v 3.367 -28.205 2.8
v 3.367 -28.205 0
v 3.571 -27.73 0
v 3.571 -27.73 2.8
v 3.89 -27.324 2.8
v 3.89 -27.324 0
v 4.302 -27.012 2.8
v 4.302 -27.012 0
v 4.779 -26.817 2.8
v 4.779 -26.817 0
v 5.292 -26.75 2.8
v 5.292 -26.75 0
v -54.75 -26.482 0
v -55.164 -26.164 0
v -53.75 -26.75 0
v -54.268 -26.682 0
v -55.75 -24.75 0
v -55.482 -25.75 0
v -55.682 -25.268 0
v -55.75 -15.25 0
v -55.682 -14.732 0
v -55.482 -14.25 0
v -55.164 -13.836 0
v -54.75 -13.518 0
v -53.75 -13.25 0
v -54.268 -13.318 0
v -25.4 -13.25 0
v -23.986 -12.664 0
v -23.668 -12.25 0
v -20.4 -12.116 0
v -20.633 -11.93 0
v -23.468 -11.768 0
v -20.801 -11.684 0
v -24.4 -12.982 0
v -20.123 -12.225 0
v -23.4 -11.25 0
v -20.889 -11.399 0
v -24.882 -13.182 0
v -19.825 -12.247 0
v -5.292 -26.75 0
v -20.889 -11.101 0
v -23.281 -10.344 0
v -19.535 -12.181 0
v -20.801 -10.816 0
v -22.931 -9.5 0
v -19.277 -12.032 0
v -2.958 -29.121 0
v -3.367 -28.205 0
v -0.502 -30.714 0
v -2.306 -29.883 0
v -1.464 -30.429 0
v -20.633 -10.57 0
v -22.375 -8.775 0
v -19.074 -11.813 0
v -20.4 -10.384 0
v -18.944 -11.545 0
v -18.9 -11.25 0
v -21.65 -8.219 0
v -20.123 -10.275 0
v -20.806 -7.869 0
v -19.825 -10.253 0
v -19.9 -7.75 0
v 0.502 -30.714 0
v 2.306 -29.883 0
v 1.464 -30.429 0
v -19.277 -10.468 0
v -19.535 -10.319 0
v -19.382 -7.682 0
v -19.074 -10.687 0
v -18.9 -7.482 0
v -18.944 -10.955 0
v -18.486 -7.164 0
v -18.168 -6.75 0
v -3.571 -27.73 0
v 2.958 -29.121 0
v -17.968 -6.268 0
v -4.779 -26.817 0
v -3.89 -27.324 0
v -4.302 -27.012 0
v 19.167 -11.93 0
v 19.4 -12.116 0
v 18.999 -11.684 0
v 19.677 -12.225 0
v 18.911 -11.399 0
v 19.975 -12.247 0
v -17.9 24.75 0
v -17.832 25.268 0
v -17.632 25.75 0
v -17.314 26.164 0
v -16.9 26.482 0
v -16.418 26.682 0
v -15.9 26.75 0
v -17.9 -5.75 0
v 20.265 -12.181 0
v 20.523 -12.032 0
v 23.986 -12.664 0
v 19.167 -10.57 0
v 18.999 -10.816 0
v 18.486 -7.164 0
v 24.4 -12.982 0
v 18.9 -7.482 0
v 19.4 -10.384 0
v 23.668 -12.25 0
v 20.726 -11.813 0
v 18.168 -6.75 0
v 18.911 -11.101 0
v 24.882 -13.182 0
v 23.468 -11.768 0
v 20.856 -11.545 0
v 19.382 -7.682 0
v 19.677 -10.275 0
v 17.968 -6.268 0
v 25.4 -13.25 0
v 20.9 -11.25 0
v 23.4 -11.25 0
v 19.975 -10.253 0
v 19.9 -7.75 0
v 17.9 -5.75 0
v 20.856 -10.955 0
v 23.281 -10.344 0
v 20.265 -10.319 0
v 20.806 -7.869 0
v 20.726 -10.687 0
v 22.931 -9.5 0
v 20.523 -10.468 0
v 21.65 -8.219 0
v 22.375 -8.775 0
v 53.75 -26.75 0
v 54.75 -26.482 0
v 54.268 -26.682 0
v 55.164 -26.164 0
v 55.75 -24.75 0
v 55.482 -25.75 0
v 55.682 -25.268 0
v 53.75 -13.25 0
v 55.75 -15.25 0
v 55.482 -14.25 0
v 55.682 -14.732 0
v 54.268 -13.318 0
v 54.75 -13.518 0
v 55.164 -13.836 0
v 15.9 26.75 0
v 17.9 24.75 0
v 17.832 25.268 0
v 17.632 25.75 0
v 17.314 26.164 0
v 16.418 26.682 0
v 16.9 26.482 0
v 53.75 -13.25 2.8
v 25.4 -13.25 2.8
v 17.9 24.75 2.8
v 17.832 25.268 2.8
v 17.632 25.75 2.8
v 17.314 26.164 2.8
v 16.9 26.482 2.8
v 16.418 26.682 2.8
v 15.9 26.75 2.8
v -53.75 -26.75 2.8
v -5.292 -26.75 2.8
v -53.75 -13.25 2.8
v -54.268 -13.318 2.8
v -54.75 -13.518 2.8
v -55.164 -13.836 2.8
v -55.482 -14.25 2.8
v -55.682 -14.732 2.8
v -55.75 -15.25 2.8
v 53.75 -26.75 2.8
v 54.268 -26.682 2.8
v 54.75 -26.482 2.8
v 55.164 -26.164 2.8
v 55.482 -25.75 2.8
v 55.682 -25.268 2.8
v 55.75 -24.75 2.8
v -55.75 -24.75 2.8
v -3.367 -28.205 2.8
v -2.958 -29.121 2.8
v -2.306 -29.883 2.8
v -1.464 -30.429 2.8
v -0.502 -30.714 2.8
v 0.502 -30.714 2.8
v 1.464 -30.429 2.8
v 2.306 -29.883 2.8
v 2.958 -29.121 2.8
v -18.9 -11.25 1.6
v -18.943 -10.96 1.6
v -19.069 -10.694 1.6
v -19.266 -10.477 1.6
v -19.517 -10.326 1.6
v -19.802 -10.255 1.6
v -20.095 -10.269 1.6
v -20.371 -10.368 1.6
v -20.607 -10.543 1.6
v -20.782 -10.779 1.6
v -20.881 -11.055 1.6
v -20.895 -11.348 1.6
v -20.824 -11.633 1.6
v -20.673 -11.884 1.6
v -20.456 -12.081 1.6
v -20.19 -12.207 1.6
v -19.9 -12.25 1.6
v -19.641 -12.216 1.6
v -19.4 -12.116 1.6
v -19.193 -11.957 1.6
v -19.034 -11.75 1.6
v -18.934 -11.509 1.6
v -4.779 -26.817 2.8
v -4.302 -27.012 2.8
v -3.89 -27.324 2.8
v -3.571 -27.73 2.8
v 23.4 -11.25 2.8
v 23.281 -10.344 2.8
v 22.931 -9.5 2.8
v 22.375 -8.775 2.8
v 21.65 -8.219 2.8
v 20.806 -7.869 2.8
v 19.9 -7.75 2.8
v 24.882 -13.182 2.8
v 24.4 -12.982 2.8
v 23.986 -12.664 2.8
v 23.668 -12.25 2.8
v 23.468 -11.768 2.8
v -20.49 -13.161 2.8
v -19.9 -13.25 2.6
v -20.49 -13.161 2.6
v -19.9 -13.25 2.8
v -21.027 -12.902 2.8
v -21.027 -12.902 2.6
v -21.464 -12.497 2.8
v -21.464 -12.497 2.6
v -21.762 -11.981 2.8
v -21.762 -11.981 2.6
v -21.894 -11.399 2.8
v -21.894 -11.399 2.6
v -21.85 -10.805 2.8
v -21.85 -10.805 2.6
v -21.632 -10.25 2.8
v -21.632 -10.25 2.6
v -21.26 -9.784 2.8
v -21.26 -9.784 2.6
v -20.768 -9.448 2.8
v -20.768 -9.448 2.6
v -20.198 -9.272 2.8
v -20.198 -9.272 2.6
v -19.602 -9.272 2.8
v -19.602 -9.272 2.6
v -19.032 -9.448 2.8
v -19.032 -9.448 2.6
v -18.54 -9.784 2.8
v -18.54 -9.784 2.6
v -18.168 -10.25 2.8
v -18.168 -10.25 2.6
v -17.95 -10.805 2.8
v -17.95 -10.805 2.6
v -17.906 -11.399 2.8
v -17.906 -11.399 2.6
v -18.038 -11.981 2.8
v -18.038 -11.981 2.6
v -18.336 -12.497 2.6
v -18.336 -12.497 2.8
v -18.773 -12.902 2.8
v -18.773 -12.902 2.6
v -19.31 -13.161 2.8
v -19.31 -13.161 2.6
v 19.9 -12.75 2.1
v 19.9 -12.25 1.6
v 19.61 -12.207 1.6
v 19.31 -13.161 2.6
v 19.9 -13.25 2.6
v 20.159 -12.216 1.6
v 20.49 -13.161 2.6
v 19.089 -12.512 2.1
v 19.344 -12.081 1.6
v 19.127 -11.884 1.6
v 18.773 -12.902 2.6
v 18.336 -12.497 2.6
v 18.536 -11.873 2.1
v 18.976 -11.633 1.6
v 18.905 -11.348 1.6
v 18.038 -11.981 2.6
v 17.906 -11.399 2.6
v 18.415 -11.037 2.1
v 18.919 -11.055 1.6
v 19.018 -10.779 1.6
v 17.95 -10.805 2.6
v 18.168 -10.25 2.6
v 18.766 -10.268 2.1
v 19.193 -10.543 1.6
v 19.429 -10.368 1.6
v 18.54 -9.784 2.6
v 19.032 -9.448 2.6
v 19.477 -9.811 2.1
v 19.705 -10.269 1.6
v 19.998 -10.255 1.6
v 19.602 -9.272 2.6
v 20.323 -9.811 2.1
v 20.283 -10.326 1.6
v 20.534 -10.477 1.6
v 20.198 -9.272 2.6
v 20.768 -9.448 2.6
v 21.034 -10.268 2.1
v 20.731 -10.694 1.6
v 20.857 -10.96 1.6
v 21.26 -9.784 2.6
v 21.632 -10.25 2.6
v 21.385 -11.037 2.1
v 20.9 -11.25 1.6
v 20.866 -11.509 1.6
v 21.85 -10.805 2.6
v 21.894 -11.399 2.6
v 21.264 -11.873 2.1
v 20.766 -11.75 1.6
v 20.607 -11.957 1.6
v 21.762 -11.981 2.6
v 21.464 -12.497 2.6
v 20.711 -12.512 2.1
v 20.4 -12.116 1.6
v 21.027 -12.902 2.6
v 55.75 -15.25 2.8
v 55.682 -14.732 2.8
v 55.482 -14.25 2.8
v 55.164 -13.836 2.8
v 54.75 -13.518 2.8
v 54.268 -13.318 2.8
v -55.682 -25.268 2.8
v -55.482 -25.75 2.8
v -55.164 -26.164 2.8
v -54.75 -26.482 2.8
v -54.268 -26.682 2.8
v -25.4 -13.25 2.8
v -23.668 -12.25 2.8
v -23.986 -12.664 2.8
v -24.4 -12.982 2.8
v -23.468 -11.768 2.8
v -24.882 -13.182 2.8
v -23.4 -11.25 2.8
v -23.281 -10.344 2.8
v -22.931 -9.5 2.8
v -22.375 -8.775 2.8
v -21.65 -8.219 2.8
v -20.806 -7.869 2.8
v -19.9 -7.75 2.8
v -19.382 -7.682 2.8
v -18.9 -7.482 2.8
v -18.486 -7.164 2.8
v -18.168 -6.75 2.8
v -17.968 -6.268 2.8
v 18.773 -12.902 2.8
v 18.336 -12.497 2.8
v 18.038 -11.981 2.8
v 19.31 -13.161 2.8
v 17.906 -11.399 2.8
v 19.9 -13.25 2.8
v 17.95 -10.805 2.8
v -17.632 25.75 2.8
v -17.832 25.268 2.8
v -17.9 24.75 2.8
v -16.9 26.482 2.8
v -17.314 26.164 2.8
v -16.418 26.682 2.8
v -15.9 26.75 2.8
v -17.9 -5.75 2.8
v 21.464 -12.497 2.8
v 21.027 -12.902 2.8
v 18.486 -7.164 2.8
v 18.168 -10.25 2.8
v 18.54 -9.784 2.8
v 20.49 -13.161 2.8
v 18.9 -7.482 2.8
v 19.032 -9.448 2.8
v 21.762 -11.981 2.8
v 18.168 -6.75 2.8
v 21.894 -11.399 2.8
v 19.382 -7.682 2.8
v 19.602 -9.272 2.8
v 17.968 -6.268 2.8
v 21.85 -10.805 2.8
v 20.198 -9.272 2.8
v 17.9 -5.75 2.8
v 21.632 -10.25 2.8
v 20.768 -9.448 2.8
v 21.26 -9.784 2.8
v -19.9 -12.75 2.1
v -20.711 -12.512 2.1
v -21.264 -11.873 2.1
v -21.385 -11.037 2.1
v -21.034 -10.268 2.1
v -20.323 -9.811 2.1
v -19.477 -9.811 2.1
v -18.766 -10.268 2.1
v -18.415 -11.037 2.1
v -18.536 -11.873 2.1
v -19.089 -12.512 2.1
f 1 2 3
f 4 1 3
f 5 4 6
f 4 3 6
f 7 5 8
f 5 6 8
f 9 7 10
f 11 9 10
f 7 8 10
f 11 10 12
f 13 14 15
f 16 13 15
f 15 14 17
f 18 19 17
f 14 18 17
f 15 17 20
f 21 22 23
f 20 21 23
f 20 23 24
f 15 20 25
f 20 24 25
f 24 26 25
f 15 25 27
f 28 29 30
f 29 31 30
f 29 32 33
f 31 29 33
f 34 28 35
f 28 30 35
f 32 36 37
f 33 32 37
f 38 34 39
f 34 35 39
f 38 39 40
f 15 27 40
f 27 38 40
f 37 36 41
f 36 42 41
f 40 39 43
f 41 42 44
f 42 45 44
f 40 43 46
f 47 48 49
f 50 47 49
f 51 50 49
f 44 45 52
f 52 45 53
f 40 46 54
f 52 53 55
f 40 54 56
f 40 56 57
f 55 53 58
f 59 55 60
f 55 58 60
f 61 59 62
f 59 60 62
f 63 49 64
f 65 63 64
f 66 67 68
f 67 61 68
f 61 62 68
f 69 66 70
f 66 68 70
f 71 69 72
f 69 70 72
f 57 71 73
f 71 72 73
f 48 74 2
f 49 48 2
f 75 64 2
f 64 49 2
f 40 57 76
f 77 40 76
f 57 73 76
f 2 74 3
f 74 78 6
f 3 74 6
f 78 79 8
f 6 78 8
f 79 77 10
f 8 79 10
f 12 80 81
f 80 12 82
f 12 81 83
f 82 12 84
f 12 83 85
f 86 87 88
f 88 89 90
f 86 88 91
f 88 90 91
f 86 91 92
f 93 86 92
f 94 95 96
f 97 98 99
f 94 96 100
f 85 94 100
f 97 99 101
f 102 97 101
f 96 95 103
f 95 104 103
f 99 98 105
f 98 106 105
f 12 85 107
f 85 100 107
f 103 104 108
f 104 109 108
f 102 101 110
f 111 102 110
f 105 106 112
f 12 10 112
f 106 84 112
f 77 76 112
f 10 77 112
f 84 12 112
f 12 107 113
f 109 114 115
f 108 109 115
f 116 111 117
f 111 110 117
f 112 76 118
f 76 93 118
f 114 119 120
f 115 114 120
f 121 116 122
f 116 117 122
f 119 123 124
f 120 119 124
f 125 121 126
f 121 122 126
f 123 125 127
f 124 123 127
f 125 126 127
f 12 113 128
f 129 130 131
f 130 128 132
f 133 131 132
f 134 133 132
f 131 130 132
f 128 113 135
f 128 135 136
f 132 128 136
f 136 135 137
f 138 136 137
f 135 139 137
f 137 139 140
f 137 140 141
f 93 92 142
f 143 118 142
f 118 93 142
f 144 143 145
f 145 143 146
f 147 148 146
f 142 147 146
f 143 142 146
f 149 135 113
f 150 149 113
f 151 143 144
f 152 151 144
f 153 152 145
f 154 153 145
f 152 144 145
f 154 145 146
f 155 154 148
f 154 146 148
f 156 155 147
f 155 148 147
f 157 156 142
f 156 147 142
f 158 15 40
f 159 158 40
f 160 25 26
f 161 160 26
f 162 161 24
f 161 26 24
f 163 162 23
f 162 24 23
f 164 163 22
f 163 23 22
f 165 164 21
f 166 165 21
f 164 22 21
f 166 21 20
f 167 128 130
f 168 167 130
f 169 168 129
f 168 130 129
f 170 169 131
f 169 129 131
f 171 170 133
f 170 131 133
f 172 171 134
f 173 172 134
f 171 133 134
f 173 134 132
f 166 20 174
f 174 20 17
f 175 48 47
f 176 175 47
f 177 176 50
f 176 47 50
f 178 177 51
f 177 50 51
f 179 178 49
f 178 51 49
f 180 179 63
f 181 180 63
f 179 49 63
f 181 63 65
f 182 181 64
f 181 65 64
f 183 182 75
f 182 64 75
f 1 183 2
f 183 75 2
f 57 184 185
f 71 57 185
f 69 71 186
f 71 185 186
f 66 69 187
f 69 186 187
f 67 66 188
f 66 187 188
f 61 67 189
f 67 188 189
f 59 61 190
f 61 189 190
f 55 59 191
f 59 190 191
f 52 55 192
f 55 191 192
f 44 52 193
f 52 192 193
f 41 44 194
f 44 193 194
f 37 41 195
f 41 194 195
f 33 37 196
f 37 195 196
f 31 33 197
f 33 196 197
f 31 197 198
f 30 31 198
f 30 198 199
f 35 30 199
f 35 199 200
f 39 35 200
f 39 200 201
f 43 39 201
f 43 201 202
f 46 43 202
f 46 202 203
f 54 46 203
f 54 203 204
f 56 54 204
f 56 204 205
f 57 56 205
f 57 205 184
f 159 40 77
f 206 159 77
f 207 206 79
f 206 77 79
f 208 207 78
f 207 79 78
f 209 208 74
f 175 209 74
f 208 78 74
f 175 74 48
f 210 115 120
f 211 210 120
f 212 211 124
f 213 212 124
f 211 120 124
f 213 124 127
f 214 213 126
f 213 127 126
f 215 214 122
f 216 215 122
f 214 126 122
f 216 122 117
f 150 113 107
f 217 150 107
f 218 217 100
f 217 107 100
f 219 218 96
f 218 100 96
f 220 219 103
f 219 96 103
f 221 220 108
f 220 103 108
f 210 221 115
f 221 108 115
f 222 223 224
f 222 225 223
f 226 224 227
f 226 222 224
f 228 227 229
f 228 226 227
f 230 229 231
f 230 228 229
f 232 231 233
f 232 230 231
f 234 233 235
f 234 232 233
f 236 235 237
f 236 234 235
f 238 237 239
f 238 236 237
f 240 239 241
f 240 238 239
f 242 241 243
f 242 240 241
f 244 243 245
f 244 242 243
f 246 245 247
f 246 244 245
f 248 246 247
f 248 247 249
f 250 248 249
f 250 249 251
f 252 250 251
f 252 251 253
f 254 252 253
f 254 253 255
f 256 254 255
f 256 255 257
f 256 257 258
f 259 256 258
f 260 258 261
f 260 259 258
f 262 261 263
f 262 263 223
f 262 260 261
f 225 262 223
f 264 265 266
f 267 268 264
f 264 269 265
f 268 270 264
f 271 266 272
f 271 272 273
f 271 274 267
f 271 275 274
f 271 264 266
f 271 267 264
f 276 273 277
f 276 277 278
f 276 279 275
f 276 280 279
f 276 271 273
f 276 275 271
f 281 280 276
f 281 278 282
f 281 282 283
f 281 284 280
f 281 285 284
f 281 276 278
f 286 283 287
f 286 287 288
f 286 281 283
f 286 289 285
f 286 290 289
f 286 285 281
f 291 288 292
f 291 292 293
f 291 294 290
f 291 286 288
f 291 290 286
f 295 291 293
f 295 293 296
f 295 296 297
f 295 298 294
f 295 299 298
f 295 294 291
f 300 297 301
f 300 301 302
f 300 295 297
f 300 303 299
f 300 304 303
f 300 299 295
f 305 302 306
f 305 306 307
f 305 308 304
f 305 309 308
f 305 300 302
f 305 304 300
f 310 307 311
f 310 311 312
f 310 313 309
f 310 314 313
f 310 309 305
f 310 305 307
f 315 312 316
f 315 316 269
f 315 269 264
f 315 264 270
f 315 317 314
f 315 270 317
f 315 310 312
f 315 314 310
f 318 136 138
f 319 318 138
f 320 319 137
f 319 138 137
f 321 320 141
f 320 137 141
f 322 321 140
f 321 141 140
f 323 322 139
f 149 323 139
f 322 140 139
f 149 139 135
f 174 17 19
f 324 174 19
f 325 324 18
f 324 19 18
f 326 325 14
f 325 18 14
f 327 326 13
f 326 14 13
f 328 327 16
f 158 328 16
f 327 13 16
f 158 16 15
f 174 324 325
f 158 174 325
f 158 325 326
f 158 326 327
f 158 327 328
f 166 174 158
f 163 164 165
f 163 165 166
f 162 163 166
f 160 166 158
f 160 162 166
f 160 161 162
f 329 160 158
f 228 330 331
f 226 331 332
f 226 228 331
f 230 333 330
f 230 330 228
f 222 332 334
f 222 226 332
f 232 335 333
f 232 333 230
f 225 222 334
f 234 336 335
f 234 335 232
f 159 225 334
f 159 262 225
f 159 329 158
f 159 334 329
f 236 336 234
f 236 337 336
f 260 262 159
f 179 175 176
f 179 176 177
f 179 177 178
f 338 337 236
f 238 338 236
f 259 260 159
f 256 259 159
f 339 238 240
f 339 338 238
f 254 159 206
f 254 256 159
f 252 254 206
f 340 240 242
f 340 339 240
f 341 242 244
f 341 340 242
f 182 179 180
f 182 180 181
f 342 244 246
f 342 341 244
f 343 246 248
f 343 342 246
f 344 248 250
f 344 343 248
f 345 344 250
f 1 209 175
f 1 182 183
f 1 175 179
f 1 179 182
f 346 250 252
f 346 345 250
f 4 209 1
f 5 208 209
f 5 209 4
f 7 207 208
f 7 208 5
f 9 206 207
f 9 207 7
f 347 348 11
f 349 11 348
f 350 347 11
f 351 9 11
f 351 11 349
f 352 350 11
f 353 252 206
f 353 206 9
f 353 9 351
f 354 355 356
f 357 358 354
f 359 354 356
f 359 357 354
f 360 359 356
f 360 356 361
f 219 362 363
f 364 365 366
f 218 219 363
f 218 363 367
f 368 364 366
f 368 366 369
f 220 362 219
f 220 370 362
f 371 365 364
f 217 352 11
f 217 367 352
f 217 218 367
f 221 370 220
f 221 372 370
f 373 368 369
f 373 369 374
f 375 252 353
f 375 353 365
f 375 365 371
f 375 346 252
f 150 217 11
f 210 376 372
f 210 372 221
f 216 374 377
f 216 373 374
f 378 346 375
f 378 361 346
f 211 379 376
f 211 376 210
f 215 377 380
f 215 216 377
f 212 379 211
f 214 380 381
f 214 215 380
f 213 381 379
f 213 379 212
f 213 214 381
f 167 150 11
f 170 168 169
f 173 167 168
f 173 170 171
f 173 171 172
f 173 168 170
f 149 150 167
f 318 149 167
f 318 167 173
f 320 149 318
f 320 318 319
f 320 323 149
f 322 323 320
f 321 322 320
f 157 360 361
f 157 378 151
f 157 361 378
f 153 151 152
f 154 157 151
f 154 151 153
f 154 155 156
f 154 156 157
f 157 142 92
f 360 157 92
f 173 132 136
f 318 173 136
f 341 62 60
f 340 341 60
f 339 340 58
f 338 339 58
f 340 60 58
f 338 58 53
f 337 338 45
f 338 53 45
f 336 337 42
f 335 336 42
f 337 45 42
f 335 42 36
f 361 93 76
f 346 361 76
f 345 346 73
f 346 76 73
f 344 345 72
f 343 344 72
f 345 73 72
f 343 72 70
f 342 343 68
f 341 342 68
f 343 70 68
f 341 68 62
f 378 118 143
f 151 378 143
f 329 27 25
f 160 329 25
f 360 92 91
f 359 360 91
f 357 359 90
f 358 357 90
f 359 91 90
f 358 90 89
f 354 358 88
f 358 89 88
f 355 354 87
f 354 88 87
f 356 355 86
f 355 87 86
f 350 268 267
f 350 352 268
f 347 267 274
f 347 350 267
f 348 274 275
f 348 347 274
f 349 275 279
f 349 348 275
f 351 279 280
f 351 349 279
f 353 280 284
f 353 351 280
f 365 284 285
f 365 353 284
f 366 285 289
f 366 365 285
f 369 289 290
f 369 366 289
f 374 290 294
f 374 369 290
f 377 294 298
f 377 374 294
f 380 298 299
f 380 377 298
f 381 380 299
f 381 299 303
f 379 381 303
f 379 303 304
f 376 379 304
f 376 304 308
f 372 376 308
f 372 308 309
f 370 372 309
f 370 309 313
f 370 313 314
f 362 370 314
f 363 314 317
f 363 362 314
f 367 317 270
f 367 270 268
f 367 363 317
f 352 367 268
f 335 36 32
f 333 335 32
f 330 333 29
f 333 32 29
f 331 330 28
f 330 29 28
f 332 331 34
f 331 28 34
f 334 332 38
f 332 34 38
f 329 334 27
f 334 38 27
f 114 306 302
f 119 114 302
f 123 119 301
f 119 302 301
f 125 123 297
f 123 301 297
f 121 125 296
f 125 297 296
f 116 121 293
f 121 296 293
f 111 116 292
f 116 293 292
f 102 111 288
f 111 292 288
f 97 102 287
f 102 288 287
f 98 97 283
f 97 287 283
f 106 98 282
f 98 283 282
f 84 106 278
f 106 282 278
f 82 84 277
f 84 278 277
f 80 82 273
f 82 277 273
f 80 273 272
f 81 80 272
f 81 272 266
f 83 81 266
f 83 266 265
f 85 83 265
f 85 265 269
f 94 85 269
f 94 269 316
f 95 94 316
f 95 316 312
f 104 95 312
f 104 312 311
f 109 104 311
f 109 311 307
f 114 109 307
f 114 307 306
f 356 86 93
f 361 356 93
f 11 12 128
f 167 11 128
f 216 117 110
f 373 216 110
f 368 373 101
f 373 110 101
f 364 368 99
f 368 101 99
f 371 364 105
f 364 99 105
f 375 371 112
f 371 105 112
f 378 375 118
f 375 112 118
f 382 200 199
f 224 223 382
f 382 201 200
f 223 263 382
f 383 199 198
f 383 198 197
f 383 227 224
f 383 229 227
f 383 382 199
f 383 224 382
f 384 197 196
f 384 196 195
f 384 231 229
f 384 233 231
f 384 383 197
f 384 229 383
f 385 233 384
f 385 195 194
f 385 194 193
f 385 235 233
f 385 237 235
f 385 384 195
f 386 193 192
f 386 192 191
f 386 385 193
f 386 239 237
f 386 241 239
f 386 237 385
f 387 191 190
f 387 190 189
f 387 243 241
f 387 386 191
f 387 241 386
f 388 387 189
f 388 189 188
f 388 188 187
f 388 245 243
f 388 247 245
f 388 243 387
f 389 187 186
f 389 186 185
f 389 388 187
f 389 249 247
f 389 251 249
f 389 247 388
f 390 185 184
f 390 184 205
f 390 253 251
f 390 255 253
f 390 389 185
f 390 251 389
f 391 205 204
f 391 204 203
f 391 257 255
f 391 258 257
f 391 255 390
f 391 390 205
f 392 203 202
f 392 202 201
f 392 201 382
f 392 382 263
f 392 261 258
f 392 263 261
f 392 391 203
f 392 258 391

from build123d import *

# Parameters (mm, degrees)
BOSS_EXTRUDE1_DEPTH                            = 2.8
CUT_EXTRUDE1_REACH                             = 4.8
SKETCH3_R                                      = 1
CSK_FOR_M2_FLAT_HEAD_MACHINE_SCREW1_AT_2_COUNT = 2
CSK_FOR_M2_FLAT_HEAD_MACHINE_SCREW1_AT_2_PITCH = 39.8


with BuildPart() as part:
    # Sketch1 → Boss-Extrude1 (new body)
    with BuildSketch(Plane.XY):
        with BuildLine():
            Line((-53.75, -26.75), (-5.291502622, -26.75))
            ThreePointArc((-5.291502622, -26.75), (-4.085457244, -27.15455193), (-3.36731985, -28.204545455))
            ThreePointArc((-3.36731985, -28.204545455), (0, -30.75), (3.36731985, -28.204545455))
            ThreePointArc((3.36731985, -28.204545455), (4.085457244, -27.15455193), (5.291502622, -26.75))
            Line((5.291502622, -26.75), (53.75, -26.75))
            ThreePointArc((53.75, -26.75), (55.164213562, -26.164213562), (55.75, -24.75))
            Line((55.75, -24.75), (55.75, -15.25))
            ThreePointArc((55.75, -15.25), (55.164213562, -13.835786438), (53.75, -13.25))
            Line((53.75, -13.25), (25.4, -13.25))
            ThreePointArc((25.4, -13.25), (23.985786438, -12.664213562), (23.4, -11.25))
            ThreePointArc((23.4, -11.25), (22.374873734, -8.775126266), (19.9, -7.75))
            ThreePointArc((19.9, -7.75), (18.485786438, -7.164213562), (17.9, -5.75))
            Line((17.9, -5.75), (17.9, 24.75))
            ThreePointArc((17.9, 24.75), (17.314213562, 26.164213562), (15.9, 26.75))
            Line((15.9, 26.75), (-15.9, 26.75))
            ThreePointArc((-15.9, 26.75), (-17.314213562, 26.164213562), (-17.9, 24.75))
            Line((-17.9, 24.75), (-17.9, -5.75))
            ThreePointArc((-17.9, -5.75), (-18.485786438, -7.164213562), (-19.9, -7.75))
            ThreePointArc((-19.9, -7.75), (-22.374873734, -8.775126266), (-23.4, -11.25))
            ThreePointArc((-23.4, -11.25), (-23.985786438, -12.664213562), (-25.4, -13.25))
            Line((-25.4, -13.25), (-53.75, -13.25))
            ThreePointArc((-53.75, -13.25), (-55.164213562, -13.835786438), (-55.75, -15.25))
            Line((-55.75, -15.25), (-55.75, -24.75))
            ThreePointArc((-55.75, -24.75), (-55.164213562, -26.164213562), (-53.75, -26.75))
        make_face()
    extrude(amount=BOSS_EXTRUDE1_DEPTH)

    # Sketch3 → Cut-Extrude1 (cut, up to next)
    with BuildSketch(Plane.XY.offset(2.8), mode=Mode.PRIVATE) as cut_extrude1_sk1:
        with Locations((-19.9, -11.25)):
            Circle(SKETCH3_R)
    cut_extrude1_tool1 = extrude(cut_extrude1_sk1.sketch, amount=-CUT_EXTRUDE1_REACH, mode=Mode.PRIVATE) & part.part
    add(cut_extrude1_tool1.solids().sort_by_distance((-19.9, -11.25, 2.8))[0], mode=Mode.SUBTRACT)
    # Sketch3 → Cut-Extrude1 (cut, up to next)
    with BuildSketch(Plane.XY.offset(2.8), mode=Mode.PRIVATE) as cut_extrude1_sk2:
        with Locations((19.9, -11.25)):
            Circle(SKETCH3_R)
    cut_extrude1_tool2 = extrude(cut_extrude1_sk2.sketch, amount=-CUT_EXTRUDE1_REACH, mode=Mode.PRIVATE) & part.part
    add(cut_extrude1_tool2.solids().sort_by_distance((19.9, -11.25, 2.8))[0], mode=Mode.SUBTRACT)

    # Sketch4 → CSK for M2 Flat Head Machine Screw1 (revolve, cut)
    with BuildSketch(Plane(origin=(-19.9, -11.25, 2.8), x_dir=(0, -1, 0), z_dir=(1, 0, 0))):
        Polygon((0, 0), (0, 2.8), (1, 2.8), (1, 1.2), (2, 0.2), (2, 0), align=None)
    csk_for_m2_flat_head_machine_screw1 = revolve(axis=Axis((-19.9, -11.25, 9.15), (0, 0, -1)), mode=Mode.SUBTRACT)

    # CSK for M2 Flat Head Machine Screw1 at 2: CSK for M2 Flat Head Machine Screw1 ×2
    with Locations(*[(i * CSK_FOR_M2_FLAT_HEAD_MACHINE_SCREW1_AT_2_PITCH, 0, 0) for i in range(1, CSK_FOR_M2_FLAT_HEAD_MACHINE_SCREW1_AT_2_COUNT)]):
        add(csk_for_m2_flat_head_machine_screw1, mode=Mode.SUBTRACT)


solid = part.part
